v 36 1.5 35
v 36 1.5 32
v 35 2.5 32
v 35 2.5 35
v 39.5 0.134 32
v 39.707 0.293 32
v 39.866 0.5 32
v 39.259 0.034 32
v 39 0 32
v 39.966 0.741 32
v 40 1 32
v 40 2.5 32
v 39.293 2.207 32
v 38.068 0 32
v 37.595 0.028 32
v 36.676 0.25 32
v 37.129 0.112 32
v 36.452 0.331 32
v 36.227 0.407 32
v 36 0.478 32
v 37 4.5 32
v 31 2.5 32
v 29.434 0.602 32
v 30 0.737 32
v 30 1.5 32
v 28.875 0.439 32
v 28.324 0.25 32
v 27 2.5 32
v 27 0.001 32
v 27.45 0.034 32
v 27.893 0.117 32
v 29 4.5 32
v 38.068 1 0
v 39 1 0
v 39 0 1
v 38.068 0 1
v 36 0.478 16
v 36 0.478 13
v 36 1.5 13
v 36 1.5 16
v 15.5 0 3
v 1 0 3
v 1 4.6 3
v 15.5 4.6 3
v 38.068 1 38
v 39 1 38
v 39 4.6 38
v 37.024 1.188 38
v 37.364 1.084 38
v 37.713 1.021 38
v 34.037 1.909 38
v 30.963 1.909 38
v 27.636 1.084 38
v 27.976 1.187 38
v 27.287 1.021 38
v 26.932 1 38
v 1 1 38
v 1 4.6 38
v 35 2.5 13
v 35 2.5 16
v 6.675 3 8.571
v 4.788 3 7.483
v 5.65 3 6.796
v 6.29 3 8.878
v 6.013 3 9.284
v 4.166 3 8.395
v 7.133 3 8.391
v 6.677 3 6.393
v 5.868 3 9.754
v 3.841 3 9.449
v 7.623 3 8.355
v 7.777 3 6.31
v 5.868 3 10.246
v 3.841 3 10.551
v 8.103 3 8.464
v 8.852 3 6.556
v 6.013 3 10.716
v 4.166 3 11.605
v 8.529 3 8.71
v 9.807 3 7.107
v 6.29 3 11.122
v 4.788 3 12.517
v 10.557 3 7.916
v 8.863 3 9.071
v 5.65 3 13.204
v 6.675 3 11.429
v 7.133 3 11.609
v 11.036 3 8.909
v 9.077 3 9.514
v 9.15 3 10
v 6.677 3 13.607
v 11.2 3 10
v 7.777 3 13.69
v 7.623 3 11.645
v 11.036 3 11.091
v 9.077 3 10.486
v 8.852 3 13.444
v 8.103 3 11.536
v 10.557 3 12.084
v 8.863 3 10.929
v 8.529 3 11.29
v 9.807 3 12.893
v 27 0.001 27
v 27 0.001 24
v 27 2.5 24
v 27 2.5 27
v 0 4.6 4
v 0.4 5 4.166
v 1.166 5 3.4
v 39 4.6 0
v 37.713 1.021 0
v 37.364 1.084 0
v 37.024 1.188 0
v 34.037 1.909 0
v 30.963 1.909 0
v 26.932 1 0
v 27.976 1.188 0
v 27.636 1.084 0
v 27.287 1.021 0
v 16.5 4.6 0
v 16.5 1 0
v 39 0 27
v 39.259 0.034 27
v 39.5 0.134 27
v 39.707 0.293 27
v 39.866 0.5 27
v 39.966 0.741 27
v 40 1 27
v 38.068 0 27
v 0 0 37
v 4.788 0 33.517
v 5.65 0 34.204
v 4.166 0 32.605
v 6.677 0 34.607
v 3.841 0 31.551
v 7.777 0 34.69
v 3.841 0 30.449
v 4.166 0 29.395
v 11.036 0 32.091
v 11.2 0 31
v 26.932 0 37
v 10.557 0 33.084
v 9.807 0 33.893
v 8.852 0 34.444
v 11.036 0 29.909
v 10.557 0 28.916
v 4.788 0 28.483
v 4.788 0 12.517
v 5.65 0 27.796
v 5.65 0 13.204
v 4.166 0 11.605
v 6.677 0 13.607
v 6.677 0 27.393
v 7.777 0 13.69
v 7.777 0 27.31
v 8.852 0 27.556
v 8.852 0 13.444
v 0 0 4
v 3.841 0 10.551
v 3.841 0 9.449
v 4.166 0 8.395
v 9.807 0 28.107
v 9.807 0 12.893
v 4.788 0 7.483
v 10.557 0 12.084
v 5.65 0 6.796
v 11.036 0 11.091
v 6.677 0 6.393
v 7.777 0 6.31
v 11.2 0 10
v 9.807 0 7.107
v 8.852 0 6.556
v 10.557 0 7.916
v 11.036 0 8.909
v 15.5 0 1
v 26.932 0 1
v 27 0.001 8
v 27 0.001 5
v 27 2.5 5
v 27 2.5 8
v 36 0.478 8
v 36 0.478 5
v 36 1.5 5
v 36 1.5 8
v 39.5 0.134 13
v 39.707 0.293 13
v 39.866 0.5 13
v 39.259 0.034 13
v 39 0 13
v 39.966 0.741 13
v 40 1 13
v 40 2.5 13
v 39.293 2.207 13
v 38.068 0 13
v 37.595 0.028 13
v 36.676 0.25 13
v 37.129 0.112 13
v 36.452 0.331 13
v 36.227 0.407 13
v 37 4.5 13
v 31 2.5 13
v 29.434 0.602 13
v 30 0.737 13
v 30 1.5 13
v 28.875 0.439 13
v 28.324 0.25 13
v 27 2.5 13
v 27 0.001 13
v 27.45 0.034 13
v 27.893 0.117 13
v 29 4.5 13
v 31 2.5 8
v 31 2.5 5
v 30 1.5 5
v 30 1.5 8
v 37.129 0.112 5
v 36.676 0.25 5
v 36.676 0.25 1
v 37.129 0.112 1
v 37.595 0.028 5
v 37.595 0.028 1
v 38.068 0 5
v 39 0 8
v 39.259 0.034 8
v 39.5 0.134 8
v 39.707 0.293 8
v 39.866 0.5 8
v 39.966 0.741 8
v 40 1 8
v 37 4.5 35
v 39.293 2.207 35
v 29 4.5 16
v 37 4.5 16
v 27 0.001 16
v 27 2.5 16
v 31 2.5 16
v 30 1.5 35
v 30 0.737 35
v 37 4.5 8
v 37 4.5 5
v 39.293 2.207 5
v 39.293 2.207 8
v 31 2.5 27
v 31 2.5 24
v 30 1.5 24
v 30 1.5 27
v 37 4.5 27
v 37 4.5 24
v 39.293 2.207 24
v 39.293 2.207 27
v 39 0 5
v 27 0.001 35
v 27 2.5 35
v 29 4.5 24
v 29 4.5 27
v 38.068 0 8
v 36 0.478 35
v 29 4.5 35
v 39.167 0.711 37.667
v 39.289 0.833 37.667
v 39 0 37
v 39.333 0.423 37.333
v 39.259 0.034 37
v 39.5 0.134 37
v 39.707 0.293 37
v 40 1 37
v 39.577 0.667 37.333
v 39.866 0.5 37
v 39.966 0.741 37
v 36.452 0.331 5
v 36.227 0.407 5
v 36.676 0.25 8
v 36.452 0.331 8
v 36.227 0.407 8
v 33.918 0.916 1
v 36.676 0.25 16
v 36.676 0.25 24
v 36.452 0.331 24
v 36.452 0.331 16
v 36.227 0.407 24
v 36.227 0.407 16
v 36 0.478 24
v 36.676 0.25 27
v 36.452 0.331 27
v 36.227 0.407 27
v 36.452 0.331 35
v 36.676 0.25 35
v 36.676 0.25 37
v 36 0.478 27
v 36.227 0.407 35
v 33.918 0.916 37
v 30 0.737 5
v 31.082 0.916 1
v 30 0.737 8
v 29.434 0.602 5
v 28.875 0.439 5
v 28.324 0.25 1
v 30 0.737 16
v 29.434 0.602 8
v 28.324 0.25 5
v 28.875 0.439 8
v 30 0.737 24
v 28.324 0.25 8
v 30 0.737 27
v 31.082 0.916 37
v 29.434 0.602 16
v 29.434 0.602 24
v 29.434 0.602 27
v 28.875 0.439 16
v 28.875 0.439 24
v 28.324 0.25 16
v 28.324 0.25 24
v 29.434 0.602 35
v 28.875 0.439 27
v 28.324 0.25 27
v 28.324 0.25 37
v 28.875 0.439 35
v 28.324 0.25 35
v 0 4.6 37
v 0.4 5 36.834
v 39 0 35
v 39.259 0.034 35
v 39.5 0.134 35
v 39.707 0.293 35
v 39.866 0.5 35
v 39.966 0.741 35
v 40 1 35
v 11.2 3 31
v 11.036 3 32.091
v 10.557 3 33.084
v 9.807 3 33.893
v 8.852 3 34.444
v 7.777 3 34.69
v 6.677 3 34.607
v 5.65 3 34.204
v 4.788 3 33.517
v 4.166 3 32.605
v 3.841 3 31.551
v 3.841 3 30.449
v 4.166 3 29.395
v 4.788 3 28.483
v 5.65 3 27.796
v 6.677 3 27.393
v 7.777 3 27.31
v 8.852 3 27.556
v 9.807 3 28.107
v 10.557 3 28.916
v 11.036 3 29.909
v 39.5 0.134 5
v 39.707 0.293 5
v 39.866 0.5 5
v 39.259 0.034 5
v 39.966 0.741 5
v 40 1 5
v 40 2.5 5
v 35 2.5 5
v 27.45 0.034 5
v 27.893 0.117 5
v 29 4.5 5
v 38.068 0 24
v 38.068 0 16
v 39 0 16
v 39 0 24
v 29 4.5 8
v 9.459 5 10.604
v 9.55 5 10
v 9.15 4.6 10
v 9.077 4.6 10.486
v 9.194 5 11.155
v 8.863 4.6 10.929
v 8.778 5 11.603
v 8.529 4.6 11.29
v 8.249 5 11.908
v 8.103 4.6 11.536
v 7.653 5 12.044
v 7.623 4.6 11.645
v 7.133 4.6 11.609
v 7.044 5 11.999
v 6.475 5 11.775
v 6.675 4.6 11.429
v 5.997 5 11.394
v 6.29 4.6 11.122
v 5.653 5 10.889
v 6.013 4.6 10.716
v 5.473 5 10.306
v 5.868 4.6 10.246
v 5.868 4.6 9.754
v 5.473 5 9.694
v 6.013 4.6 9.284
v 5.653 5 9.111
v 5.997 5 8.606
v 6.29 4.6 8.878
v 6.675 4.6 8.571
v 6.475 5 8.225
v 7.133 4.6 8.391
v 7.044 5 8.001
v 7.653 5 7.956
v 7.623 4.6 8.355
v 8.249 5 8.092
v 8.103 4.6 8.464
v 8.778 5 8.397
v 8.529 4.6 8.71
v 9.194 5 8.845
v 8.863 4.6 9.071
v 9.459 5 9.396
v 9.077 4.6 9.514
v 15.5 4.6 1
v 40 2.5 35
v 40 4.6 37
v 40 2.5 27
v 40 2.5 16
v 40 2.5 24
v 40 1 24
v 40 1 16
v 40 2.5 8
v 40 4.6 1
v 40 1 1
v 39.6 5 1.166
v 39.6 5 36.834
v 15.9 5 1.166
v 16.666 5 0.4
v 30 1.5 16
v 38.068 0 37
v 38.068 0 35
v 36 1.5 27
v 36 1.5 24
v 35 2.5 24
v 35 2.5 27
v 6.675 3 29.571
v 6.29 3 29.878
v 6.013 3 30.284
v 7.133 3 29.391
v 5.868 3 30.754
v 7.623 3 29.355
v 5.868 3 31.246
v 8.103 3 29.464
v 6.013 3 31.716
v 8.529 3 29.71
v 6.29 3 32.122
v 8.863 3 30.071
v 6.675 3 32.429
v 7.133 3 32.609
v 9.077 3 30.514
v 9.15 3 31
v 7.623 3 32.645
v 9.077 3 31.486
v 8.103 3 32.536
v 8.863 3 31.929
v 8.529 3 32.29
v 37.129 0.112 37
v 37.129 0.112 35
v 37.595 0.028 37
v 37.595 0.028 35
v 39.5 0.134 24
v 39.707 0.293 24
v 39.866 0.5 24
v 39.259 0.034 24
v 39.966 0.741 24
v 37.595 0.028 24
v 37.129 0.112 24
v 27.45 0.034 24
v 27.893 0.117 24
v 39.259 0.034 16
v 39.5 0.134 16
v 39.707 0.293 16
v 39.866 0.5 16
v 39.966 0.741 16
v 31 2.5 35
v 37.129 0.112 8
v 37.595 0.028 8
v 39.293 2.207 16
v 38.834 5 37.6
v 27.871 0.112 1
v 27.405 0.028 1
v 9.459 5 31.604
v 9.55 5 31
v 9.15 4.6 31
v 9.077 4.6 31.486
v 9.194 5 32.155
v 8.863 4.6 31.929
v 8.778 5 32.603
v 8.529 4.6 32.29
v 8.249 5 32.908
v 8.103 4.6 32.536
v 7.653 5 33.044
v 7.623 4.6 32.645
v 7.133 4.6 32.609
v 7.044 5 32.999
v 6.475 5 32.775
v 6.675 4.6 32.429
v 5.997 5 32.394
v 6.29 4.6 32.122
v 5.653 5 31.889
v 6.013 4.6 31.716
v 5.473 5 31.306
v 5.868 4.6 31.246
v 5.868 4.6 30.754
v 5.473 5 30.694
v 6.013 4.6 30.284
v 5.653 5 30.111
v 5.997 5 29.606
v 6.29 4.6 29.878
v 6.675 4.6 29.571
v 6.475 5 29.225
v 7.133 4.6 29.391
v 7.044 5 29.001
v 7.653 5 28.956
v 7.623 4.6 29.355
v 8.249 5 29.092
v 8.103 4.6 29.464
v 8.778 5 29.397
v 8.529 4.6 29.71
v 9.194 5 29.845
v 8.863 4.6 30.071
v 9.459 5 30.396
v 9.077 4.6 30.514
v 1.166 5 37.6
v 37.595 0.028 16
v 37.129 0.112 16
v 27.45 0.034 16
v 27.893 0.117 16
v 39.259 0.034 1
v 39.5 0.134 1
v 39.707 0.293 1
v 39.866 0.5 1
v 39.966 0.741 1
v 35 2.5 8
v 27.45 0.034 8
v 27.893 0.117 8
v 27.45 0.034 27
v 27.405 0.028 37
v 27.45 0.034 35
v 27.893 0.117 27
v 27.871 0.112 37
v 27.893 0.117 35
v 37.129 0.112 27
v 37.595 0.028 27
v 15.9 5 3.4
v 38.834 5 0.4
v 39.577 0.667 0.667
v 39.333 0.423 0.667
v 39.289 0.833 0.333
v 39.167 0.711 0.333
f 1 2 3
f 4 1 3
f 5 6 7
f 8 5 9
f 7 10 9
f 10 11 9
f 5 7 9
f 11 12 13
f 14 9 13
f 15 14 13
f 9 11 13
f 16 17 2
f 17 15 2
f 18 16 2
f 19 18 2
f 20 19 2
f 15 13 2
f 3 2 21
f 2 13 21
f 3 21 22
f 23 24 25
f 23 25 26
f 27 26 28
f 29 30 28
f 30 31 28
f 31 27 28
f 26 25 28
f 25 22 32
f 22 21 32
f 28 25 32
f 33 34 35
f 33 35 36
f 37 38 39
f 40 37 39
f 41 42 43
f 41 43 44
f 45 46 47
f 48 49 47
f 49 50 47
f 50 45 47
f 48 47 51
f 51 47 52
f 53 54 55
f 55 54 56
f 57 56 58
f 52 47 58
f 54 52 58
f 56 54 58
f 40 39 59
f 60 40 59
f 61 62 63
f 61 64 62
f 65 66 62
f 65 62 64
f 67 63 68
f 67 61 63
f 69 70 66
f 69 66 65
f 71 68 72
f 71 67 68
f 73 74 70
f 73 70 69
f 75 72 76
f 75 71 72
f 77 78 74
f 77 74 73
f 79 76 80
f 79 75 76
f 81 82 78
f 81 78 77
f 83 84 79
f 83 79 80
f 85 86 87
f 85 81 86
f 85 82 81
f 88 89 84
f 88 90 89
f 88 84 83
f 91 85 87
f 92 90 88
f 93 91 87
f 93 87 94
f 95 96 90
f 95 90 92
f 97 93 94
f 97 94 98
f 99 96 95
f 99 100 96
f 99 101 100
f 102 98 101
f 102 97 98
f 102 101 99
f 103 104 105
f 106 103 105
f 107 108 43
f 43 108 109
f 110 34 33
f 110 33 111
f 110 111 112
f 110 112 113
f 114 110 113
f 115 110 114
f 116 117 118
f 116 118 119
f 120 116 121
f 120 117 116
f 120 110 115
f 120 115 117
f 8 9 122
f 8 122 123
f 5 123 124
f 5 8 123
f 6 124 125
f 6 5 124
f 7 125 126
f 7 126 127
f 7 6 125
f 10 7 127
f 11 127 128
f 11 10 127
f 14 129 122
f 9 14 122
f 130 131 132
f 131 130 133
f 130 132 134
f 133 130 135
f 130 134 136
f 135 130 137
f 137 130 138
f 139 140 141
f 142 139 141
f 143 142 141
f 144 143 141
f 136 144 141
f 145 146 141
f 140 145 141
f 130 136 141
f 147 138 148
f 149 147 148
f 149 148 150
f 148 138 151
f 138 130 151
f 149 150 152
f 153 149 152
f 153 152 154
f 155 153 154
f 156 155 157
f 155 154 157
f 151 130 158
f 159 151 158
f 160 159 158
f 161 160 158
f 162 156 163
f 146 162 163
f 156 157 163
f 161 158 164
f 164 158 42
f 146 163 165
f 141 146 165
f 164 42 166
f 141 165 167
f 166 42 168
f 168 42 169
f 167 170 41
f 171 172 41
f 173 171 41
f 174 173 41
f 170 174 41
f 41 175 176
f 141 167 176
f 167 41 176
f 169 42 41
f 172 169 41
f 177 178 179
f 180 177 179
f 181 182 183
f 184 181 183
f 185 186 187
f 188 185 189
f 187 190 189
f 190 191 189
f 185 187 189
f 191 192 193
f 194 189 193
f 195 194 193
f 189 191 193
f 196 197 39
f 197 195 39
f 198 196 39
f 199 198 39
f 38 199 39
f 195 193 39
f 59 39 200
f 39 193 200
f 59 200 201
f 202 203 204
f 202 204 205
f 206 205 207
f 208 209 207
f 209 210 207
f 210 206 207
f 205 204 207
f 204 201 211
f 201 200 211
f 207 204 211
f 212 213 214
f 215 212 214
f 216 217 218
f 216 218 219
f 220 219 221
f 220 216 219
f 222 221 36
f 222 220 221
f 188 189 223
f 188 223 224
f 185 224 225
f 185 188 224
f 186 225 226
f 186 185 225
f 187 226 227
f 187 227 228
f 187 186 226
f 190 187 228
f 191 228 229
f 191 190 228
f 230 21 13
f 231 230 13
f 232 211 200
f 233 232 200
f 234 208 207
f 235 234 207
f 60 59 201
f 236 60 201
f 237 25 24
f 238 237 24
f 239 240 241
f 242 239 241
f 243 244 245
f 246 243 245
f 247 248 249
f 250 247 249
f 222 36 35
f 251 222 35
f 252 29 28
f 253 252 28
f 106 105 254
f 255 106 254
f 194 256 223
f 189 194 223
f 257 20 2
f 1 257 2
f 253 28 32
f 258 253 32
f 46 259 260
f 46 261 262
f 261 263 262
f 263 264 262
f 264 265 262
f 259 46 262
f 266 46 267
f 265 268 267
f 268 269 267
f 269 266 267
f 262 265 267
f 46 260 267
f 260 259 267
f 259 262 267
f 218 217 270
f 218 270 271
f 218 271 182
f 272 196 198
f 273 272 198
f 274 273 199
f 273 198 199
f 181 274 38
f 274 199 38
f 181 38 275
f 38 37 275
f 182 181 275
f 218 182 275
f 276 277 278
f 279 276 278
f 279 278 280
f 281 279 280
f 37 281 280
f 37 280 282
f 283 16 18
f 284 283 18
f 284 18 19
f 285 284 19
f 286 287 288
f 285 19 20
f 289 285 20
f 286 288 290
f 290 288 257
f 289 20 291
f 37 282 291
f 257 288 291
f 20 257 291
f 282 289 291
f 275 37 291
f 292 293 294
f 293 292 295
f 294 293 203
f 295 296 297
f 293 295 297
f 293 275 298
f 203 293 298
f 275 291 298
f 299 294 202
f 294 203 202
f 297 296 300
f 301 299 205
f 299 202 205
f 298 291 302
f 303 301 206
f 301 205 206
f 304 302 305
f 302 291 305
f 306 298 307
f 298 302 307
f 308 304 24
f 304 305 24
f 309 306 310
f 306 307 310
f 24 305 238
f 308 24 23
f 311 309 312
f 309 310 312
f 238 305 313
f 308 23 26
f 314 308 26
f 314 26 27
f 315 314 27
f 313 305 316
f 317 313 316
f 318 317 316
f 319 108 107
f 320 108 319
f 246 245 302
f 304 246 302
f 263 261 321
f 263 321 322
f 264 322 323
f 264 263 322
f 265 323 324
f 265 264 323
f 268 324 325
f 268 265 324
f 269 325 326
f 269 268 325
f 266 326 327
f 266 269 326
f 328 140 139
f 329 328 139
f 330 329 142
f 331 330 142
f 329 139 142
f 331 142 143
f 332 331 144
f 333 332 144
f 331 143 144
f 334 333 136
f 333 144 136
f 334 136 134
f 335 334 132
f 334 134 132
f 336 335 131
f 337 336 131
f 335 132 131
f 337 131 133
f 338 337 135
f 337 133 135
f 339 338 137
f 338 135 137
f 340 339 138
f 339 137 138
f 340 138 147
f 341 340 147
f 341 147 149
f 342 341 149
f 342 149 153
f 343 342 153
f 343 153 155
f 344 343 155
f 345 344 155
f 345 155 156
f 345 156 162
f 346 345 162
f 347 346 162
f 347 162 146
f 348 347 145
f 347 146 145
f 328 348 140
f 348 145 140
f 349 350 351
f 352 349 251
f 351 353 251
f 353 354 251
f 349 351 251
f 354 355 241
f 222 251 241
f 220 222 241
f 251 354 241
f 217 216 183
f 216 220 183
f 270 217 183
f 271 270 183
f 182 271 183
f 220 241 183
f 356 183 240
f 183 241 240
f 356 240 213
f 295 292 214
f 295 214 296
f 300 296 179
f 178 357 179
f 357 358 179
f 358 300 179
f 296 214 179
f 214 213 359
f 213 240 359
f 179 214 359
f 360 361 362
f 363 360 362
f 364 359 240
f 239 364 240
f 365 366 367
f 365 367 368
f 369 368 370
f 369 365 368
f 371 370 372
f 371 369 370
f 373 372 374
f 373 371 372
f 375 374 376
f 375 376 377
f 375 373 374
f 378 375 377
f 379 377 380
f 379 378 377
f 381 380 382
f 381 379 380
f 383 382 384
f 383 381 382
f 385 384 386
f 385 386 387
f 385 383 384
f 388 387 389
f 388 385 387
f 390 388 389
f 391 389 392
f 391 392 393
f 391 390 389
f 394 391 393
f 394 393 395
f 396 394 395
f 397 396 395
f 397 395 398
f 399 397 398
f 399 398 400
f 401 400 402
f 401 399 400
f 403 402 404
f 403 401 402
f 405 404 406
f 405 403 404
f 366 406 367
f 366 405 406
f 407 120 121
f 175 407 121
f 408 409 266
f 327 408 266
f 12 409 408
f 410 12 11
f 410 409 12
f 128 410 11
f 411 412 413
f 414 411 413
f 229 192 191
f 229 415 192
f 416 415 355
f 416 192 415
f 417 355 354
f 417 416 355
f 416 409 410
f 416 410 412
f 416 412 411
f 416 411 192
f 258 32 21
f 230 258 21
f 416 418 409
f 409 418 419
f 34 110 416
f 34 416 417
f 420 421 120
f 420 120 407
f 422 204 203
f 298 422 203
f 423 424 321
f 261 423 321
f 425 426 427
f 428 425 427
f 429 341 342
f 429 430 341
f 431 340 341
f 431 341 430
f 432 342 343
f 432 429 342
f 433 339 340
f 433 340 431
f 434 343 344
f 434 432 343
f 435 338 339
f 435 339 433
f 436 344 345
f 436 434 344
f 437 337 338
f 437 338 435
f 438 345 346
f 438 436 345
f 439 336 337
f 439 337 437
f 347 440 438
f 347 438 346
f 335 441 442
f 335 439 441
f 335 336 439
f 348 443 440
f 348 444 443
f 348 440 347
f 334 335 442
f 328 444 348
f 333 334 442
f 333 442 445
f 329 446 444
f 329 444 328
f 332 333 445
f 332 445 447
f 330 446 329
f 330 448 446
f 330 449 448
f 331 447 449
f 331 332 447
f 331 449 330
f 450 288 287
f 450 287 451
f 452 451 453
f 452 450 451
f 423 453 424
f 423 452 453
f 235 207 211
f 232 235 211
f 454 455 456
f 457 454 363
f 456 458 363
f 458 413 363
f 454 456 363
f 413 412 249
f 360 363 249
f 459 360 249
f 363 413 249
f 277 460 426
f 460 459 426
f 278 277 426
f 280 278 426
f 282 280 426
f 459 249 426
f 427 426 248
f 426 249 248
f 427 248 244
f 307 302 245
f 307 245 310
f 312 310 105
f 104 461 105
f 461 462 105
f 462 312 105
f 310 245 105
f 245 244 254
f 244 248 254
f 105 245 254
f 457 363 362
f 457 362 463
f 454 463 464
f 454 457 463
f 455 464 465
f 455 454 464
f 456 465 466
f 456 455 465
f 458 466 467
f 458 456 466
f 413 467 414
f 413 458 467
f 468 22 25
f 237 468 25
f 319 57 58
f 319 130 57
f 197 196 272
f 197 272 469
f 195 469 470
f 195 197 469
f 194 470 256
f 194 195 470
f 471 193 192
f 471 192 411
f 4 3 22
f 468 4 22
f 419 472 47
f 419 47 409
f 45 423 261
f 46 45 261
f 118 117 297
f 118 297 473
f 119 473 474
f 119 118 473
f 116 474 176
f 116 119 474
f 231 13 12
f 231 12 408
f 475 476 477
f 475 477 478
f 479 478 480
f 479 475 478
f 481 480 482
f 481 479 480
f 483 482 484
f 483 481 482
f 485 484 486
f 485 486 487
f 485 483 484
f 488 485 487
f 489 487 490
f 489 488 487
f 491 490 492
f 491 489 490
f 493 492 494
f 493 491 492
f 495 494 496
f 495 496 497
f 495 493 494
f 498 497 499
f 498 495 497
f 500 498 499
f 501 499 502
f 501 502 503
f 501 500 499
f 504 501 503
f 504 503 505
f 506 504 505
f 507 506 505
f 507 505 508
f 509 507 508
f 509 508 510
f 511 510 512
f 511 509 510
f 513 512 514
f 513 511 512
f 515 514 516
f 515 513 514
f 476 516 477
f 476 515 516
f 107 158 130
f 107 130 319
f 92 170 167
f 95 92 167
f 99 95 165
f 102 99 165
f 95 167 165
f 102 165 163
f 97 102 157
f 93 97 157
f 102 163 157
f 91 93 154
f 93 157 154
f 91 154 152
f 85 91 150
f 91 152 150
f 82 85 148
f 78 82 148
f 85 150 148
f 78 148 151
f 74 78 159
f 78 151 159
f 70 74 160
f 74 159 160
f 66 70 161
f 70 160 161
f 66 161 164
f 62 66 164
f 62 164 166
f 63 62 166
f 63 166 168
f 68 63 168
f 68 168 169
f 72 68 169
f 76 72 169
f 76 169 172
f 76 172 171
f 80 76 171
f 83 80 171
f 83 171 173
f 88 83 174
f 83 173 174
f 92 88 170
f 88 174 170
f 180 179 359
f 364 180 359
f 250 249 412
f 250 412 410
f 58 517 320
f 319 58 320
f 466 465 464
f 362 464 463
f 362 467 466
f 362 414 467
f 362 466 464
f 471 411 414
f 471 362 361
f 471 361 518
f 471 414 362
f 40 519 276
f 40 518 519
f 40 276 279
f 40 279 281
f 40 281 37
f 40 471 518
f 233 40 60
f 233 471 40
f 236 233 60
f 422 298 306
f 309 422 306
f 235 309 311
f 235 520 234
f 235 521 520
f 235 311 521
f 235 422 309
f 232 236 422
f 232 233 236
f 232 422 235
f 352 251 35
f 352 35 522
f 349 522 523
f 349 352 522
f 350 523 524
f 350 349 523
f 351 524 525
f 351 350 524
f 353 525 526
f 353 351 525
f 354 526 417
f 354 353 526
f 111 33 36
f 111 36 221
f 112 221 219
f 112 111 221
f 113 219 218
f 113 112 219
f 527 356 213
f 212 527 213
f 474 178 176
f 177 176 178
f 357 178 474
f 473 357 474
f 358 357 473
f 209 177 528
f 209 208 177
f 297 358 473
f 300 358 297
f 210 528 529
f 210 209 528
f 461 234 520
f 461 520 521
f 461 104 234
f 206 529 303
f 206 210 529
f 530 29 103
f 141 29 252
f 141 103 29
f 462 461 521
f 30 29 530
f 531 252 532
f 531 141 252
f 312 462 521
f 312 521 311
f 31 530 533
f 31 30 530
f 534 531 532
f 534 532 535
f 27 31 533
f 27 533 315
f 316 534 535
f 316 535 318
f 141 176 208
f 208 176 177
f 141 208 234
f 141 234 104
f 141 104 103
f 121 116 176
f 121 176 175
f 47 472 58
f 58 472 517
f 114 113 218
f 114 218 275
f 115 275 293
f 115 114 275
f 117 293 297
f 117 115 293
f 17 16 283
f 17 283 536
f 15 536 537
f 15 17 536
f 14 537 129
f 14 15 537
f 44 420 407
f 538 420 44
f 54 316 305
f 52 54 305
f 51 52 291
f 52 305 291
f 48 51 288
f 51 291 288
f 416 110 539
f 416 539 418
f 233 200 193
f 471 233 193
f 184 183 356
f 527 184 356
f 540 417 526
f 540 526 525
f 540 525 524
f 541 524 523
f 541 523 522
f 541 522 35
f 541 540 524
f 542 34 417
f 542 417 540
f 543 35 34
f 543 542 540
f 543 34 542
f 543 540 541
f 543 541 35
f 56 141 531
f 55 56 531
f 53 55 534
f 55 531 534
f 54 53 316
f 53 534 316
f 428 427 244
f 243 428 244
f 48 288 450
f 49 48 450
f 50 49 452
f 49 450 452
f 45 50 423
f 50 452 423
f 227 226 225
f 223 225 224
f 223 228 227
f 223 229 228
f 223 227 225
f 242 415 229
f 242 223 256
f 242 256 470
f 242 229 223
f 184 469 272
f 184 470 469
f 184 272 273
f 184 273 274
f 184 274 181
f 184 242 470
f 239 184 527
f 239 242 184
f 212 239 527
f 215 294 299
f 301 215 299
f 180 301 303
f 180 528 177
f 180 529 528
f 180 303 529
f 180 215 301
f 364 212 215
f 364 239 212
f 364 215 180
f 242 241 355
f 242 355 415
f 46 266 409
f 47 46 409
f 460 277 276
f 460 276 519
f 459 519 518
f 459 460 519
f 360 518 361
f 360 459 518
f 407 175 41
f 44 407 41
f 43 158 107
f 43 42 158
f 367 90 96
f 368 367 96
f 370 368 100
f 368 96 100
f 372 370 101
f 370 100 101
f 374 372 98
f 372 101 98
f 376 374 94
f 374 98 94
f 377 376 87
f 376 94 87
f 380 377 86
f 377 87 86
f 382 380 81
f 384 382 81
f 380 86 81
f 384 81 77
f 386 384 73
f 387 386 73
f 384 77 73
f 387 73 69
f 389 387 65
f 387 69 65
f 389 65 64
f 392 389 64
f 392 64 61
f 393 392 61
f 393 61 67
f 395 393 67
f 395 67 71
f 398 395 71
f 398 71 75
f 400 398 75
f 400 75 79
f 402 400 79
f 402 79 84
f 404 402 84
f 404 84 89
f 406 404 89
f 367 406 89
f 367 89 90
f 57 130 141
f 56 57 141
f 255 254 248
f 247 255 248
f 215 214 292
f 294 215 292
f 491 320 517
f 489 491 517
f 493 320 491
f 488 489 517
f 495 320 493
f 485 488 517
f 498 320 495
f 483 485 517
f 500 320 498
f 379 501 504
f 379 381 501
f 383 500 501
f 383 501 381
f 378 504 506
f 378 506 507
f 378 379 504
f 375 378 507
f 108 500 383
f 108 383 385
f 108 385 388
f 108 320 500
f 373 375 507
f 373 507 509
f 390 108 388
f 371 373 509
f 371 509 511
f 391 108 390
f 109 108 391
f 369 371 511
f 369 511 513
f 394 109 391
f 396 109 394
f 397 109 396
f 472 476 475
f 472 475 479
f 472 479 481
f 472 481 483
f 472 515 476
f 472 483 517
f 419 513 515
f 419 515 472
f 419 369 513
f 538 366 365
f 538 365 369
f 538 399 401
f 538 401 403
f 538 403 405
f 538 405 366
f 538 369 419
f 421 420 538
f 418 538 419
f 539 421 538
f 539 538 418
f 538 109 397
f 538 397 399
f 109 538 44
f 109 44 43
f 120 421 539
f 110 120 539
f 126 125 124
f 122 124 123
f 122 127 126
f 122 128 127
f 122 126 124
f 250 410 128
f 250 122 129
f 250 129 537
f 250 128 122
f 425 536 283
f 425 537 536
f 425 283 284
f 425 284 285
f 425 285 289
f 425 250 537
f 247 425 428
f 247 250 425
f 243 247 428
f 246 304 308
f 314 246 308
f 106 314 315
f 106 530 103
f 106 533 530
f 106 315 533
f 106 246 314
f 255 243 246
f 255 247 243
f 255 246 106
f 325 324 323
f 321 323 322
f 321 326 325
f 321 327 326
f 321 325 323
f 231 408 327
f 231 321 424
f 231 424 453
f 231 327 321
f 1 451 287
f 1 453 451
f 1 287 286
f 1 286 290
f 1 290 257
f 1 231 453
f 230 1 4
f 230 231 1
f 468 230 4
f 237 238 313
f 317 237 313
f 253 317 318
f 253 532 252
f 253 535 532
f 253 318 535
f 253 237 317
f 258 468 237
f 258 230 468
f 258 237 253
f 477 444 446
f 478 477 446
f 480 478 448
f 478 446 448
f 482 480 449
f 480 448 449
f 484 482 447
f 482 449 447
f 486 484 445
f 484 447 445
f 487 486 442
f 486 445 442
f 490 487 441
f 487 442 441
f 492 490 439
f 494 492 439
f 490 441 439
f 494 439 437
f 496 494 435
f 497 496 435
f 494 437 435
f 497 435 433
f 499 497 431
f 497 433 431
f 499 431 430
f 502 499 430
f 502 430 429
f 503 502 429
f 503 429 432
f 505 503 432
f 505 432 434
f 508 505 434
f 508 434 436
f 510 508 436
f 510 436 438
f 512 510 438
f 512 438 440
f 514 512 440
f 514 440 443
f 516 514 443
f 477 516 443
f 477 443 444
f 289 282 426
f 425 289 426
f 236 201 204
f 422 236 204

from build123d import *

# Parameters (mm, degrees)
BOX_W              = 40
BOX_H              = 4
BOX_DEPTH          = 38
PAD002_DEPTH       = 3
PAD_DEPTH          = 38
SKETCH001_W        = 15.5
SKETCH001_H        = 3
POCKET_DEPTH       = 7.001
SKETCH002_R        = 12
POCKET001_DEPTH    = 38.001
FILLET_R           = 4
FILLET001_R        = 1
SKETCH003_R        = 1.65
POCKET002_DEPTH    = 7.001
SKETCH004_R        = 3.7
POCKET003_DEPTH    = 3
CHAMFER_SIZE       = 1
CHAMFER001_SIZE    = 1
SKETCH005_W        = 3
SKETCH005_H        = 5
SKETCH005_H_2      = 17
PAD001_DEPTH       = 1
CHAMFER002_SIZE    = 0.99
CHAMFER003_SIZE    = 1
CHAMFER003002_SIZE = 0.4


with BuildPart() as cube:
    # Box → Box (new body)
    with BuildSketch(Plane(origin=(0, 5, 0), x_dir=(1, 0, 0), z_dir=(0, 0, 1))):
        with Locations((20, 2)):
            Rectangle(BOX_W, BOX_H)
    extrude(amount=BOX_DEPTH)


with BuildPart() as body001:
    # Sketch006 → Pad002 (new body)
    with BuildSketch(Plane.XY):
        Polygon((27, -3), (27, 4), (29, 6), (37, 6), (40, 3), (40, -3), (36, -3), (36, 3), (35, 4), (31, 4), (30, 3), (30, -3), align=None)
    extrude(amount=PAD002_DEPTH)


with BuildPart() as body001_1:
    # Body001 placement: moved
    add(body001.part.moved(Location((0, 0, 32))))


with BuildPart() as body002:
    # Body002 base: copy of Body001
    add(body001_1.part)


with BuildPart() as body002_1:
    # Body002 placement: moved
    add(body002.part.moved(Location((0, 0, -8))))


with BuildPart() as body003:
    # Body003 base: copy of Body002
    add(body002_1.part)


with BuildPart() as body003_1:
    # Body003 placement: moved
    add(body003.part.moved(Location((0, 0, -19))))


with BuildPart() as fusion:
    # Body004 base: copy of Body003
    add(body003_1.part)


with BuildPart() as fusion_1:
    # Body004 placement: moved
    add(fusion.part.moved(Location((0, 0, 8))))

    # Fusion: union Body001, Body002, Body003
    add(body001_1.part)
    add(body002_1.part)
    add(body003_1.part)


with BuildPart() as fusion_2:
    # Fusion placement: moved
    add(fusion_1.part.moved(Location((0, -1.5, 0))))


with BuildPart() as chamfer003002:
    # Sketch → Pad (new body)
    with BuildSketch(Plane.XY):
        Polygon((0, 0), (0, 5), (15.5, 5), (15.5, 7), (25, 7), (40, 7), (40, 0), (25, 0), align=None)
    extrude(amount=PAD_DEPTH)

    # Sketch001 (on Face8 of Pad) → Pocket (cut, through all)
    with BuildSketch(Plane.XZ):
        with Locations((7.75, 1.5)):
            Rectangle(SKETCH001_W, SKETCH001_H)
    extrude(amount=-POCKET_DEPTH, mode=Mode.SUBTRACT)

    # Sketch002 (on Face4 of Pocket) → Pocket001 (cut, through all)
    with BuildSketch(Plane.XY.offset(38)):
        with Locations((32.5, -11)):
            Circle(SKETCH002_R)
    extrude(amount=-POCKET001_DEPTH, mode=Mode.SUBTRACT)

    # Fillet
    fillet_edges = [chamfer003002.edges().sort_by_distance(p)[0] for p in [
        (27.704168, 0, 19),
        (37.295832, 0, 19),
    ]]
    fillet(fillet_edges, radius=FILLET_R)

    # Fillet001
    fillet001_edges = [chamfer003002.edges().sort_by_distance(p)[0] for p in [
        (40, 0, 19),
        (40, 7, 19),
    ]]
    fillet(fillet001_edges, radius=FILLET001_R)

    # Sketch003 (on Face12 of Fillet001) → Pocket002 (cut, through all)
    with BuildSketch(Plane.XZ):
        with Locations((7.5, 31)):
            Circle(SKETCH003_R)
        with Locations((7.5, 10)):
            Circle(SKETCH003_R)
    extrude(amount=-POCKET002_DEPTH, mode=Mode.SUBTRACT)

    # Sketch004 (on Face12 of Pocket002) → Pocket003 (cut)
    with BuildSketch(Plane.XZ):
        with Locations((7.5, 31)):
            Circle(SKETCH004_R)
        with Locations((7.5, 10)):
            Circle(SKETCH004_R)
    extrude(amount=-POCKET003_DEPTH, mode=Mode.SUBTRACT)

    # Chamfer
    chamfer_edges = [chamfer003002.edges().sort_by_distance(p)[0] for p in [
        (0, 2.5, 38),
        (0, 2.5, 3),
        (15.5, 2.5, 0),
    ]]
    chamfer(chamfer_edges, length=CHAMFER_SIZE)

    # Chamfer001
    chamfer001_edges = [chamfer003002.edges().sort_by_distance(p)[0] for p in [
        (13, 0, 38),
        (32.5, 1, 0),
    ]]
    chamfer(chamfer001_edges, length=CHAMFER001_SIZE)

    # Sketch005 (on Face4 of Chamfer001) → Pad001 (join)
    with BuildSketch(Plane(origin=(0, 5, 0), x_dir=(-1, 0, 0), z_dir=(0, 1, 0))):
        with Locations((-7.5, 35.5)):
            Rectangle(SKETCH005_W, SKETCH005_H)
        with Locations((-7.5, 20.5)):
            Rectangle(SKETCH005_W, SKETCH005_H_2)
        with Locations((-7.5, 5.5)):
            Rectangle(SKETCH005_W, SKETCH005_H)
    extrude(amount=PAD001_DEPTH)

    # Chamfer002
    chamfer002_edges = [chamfer003002.edges().sort_by_distance(p)[0] for p in [
        (7.5, 6, 29),
        (7.5, 6, 8),
        (7.5, 6, 38),
    ]]
    chamfer(chamfer002_edges, length=CHAMFER002_SIZE)

    # Cut: cut Fusion
    add(fusion_2.part, mode=Mode.SUBTRACT)

    # Cut001: cut Cube
    add(cube.part, mode=Mode.SUBTRACT)

    # Chamfer003
    chamfer003_edges = [chamfer003002.edges().sort_by_distance(p)[0] for p in [
        (40, 1.5, 6.5),
        (40, 1.5, 14.5),
        (40, 1.5, 25.5),
        (40, 1.5, 33.5),
    ]]
    chamfer(chamfer003_edges, length=CHAMFER003_SIZE)

    # Chamfer003002
    chamfer003002_edges = [chamfer003002.edges().sort_by_distance(p)[0] for p in [
        (40, 5, 19),
        (39.5, 5, 0.5),
        (39.5, 5, 37.5),
        (27.75, 5, 0),
        (20, 5, 38),
        (16, 5, 0.5),
        (15.5, 5, 2),
        (0.5, 5, 37.5),
        (8.25, 5, 3),
        (0, 5, 20.5),
        (0.5, 5, 3.5),
        (5.85, 5, 31),
        (5.85, 5, 10),
    ]]
    chamfer(chamfer003002_edges, length=CHAMFER003002_SIZE)


solid = chamfer003002.part
